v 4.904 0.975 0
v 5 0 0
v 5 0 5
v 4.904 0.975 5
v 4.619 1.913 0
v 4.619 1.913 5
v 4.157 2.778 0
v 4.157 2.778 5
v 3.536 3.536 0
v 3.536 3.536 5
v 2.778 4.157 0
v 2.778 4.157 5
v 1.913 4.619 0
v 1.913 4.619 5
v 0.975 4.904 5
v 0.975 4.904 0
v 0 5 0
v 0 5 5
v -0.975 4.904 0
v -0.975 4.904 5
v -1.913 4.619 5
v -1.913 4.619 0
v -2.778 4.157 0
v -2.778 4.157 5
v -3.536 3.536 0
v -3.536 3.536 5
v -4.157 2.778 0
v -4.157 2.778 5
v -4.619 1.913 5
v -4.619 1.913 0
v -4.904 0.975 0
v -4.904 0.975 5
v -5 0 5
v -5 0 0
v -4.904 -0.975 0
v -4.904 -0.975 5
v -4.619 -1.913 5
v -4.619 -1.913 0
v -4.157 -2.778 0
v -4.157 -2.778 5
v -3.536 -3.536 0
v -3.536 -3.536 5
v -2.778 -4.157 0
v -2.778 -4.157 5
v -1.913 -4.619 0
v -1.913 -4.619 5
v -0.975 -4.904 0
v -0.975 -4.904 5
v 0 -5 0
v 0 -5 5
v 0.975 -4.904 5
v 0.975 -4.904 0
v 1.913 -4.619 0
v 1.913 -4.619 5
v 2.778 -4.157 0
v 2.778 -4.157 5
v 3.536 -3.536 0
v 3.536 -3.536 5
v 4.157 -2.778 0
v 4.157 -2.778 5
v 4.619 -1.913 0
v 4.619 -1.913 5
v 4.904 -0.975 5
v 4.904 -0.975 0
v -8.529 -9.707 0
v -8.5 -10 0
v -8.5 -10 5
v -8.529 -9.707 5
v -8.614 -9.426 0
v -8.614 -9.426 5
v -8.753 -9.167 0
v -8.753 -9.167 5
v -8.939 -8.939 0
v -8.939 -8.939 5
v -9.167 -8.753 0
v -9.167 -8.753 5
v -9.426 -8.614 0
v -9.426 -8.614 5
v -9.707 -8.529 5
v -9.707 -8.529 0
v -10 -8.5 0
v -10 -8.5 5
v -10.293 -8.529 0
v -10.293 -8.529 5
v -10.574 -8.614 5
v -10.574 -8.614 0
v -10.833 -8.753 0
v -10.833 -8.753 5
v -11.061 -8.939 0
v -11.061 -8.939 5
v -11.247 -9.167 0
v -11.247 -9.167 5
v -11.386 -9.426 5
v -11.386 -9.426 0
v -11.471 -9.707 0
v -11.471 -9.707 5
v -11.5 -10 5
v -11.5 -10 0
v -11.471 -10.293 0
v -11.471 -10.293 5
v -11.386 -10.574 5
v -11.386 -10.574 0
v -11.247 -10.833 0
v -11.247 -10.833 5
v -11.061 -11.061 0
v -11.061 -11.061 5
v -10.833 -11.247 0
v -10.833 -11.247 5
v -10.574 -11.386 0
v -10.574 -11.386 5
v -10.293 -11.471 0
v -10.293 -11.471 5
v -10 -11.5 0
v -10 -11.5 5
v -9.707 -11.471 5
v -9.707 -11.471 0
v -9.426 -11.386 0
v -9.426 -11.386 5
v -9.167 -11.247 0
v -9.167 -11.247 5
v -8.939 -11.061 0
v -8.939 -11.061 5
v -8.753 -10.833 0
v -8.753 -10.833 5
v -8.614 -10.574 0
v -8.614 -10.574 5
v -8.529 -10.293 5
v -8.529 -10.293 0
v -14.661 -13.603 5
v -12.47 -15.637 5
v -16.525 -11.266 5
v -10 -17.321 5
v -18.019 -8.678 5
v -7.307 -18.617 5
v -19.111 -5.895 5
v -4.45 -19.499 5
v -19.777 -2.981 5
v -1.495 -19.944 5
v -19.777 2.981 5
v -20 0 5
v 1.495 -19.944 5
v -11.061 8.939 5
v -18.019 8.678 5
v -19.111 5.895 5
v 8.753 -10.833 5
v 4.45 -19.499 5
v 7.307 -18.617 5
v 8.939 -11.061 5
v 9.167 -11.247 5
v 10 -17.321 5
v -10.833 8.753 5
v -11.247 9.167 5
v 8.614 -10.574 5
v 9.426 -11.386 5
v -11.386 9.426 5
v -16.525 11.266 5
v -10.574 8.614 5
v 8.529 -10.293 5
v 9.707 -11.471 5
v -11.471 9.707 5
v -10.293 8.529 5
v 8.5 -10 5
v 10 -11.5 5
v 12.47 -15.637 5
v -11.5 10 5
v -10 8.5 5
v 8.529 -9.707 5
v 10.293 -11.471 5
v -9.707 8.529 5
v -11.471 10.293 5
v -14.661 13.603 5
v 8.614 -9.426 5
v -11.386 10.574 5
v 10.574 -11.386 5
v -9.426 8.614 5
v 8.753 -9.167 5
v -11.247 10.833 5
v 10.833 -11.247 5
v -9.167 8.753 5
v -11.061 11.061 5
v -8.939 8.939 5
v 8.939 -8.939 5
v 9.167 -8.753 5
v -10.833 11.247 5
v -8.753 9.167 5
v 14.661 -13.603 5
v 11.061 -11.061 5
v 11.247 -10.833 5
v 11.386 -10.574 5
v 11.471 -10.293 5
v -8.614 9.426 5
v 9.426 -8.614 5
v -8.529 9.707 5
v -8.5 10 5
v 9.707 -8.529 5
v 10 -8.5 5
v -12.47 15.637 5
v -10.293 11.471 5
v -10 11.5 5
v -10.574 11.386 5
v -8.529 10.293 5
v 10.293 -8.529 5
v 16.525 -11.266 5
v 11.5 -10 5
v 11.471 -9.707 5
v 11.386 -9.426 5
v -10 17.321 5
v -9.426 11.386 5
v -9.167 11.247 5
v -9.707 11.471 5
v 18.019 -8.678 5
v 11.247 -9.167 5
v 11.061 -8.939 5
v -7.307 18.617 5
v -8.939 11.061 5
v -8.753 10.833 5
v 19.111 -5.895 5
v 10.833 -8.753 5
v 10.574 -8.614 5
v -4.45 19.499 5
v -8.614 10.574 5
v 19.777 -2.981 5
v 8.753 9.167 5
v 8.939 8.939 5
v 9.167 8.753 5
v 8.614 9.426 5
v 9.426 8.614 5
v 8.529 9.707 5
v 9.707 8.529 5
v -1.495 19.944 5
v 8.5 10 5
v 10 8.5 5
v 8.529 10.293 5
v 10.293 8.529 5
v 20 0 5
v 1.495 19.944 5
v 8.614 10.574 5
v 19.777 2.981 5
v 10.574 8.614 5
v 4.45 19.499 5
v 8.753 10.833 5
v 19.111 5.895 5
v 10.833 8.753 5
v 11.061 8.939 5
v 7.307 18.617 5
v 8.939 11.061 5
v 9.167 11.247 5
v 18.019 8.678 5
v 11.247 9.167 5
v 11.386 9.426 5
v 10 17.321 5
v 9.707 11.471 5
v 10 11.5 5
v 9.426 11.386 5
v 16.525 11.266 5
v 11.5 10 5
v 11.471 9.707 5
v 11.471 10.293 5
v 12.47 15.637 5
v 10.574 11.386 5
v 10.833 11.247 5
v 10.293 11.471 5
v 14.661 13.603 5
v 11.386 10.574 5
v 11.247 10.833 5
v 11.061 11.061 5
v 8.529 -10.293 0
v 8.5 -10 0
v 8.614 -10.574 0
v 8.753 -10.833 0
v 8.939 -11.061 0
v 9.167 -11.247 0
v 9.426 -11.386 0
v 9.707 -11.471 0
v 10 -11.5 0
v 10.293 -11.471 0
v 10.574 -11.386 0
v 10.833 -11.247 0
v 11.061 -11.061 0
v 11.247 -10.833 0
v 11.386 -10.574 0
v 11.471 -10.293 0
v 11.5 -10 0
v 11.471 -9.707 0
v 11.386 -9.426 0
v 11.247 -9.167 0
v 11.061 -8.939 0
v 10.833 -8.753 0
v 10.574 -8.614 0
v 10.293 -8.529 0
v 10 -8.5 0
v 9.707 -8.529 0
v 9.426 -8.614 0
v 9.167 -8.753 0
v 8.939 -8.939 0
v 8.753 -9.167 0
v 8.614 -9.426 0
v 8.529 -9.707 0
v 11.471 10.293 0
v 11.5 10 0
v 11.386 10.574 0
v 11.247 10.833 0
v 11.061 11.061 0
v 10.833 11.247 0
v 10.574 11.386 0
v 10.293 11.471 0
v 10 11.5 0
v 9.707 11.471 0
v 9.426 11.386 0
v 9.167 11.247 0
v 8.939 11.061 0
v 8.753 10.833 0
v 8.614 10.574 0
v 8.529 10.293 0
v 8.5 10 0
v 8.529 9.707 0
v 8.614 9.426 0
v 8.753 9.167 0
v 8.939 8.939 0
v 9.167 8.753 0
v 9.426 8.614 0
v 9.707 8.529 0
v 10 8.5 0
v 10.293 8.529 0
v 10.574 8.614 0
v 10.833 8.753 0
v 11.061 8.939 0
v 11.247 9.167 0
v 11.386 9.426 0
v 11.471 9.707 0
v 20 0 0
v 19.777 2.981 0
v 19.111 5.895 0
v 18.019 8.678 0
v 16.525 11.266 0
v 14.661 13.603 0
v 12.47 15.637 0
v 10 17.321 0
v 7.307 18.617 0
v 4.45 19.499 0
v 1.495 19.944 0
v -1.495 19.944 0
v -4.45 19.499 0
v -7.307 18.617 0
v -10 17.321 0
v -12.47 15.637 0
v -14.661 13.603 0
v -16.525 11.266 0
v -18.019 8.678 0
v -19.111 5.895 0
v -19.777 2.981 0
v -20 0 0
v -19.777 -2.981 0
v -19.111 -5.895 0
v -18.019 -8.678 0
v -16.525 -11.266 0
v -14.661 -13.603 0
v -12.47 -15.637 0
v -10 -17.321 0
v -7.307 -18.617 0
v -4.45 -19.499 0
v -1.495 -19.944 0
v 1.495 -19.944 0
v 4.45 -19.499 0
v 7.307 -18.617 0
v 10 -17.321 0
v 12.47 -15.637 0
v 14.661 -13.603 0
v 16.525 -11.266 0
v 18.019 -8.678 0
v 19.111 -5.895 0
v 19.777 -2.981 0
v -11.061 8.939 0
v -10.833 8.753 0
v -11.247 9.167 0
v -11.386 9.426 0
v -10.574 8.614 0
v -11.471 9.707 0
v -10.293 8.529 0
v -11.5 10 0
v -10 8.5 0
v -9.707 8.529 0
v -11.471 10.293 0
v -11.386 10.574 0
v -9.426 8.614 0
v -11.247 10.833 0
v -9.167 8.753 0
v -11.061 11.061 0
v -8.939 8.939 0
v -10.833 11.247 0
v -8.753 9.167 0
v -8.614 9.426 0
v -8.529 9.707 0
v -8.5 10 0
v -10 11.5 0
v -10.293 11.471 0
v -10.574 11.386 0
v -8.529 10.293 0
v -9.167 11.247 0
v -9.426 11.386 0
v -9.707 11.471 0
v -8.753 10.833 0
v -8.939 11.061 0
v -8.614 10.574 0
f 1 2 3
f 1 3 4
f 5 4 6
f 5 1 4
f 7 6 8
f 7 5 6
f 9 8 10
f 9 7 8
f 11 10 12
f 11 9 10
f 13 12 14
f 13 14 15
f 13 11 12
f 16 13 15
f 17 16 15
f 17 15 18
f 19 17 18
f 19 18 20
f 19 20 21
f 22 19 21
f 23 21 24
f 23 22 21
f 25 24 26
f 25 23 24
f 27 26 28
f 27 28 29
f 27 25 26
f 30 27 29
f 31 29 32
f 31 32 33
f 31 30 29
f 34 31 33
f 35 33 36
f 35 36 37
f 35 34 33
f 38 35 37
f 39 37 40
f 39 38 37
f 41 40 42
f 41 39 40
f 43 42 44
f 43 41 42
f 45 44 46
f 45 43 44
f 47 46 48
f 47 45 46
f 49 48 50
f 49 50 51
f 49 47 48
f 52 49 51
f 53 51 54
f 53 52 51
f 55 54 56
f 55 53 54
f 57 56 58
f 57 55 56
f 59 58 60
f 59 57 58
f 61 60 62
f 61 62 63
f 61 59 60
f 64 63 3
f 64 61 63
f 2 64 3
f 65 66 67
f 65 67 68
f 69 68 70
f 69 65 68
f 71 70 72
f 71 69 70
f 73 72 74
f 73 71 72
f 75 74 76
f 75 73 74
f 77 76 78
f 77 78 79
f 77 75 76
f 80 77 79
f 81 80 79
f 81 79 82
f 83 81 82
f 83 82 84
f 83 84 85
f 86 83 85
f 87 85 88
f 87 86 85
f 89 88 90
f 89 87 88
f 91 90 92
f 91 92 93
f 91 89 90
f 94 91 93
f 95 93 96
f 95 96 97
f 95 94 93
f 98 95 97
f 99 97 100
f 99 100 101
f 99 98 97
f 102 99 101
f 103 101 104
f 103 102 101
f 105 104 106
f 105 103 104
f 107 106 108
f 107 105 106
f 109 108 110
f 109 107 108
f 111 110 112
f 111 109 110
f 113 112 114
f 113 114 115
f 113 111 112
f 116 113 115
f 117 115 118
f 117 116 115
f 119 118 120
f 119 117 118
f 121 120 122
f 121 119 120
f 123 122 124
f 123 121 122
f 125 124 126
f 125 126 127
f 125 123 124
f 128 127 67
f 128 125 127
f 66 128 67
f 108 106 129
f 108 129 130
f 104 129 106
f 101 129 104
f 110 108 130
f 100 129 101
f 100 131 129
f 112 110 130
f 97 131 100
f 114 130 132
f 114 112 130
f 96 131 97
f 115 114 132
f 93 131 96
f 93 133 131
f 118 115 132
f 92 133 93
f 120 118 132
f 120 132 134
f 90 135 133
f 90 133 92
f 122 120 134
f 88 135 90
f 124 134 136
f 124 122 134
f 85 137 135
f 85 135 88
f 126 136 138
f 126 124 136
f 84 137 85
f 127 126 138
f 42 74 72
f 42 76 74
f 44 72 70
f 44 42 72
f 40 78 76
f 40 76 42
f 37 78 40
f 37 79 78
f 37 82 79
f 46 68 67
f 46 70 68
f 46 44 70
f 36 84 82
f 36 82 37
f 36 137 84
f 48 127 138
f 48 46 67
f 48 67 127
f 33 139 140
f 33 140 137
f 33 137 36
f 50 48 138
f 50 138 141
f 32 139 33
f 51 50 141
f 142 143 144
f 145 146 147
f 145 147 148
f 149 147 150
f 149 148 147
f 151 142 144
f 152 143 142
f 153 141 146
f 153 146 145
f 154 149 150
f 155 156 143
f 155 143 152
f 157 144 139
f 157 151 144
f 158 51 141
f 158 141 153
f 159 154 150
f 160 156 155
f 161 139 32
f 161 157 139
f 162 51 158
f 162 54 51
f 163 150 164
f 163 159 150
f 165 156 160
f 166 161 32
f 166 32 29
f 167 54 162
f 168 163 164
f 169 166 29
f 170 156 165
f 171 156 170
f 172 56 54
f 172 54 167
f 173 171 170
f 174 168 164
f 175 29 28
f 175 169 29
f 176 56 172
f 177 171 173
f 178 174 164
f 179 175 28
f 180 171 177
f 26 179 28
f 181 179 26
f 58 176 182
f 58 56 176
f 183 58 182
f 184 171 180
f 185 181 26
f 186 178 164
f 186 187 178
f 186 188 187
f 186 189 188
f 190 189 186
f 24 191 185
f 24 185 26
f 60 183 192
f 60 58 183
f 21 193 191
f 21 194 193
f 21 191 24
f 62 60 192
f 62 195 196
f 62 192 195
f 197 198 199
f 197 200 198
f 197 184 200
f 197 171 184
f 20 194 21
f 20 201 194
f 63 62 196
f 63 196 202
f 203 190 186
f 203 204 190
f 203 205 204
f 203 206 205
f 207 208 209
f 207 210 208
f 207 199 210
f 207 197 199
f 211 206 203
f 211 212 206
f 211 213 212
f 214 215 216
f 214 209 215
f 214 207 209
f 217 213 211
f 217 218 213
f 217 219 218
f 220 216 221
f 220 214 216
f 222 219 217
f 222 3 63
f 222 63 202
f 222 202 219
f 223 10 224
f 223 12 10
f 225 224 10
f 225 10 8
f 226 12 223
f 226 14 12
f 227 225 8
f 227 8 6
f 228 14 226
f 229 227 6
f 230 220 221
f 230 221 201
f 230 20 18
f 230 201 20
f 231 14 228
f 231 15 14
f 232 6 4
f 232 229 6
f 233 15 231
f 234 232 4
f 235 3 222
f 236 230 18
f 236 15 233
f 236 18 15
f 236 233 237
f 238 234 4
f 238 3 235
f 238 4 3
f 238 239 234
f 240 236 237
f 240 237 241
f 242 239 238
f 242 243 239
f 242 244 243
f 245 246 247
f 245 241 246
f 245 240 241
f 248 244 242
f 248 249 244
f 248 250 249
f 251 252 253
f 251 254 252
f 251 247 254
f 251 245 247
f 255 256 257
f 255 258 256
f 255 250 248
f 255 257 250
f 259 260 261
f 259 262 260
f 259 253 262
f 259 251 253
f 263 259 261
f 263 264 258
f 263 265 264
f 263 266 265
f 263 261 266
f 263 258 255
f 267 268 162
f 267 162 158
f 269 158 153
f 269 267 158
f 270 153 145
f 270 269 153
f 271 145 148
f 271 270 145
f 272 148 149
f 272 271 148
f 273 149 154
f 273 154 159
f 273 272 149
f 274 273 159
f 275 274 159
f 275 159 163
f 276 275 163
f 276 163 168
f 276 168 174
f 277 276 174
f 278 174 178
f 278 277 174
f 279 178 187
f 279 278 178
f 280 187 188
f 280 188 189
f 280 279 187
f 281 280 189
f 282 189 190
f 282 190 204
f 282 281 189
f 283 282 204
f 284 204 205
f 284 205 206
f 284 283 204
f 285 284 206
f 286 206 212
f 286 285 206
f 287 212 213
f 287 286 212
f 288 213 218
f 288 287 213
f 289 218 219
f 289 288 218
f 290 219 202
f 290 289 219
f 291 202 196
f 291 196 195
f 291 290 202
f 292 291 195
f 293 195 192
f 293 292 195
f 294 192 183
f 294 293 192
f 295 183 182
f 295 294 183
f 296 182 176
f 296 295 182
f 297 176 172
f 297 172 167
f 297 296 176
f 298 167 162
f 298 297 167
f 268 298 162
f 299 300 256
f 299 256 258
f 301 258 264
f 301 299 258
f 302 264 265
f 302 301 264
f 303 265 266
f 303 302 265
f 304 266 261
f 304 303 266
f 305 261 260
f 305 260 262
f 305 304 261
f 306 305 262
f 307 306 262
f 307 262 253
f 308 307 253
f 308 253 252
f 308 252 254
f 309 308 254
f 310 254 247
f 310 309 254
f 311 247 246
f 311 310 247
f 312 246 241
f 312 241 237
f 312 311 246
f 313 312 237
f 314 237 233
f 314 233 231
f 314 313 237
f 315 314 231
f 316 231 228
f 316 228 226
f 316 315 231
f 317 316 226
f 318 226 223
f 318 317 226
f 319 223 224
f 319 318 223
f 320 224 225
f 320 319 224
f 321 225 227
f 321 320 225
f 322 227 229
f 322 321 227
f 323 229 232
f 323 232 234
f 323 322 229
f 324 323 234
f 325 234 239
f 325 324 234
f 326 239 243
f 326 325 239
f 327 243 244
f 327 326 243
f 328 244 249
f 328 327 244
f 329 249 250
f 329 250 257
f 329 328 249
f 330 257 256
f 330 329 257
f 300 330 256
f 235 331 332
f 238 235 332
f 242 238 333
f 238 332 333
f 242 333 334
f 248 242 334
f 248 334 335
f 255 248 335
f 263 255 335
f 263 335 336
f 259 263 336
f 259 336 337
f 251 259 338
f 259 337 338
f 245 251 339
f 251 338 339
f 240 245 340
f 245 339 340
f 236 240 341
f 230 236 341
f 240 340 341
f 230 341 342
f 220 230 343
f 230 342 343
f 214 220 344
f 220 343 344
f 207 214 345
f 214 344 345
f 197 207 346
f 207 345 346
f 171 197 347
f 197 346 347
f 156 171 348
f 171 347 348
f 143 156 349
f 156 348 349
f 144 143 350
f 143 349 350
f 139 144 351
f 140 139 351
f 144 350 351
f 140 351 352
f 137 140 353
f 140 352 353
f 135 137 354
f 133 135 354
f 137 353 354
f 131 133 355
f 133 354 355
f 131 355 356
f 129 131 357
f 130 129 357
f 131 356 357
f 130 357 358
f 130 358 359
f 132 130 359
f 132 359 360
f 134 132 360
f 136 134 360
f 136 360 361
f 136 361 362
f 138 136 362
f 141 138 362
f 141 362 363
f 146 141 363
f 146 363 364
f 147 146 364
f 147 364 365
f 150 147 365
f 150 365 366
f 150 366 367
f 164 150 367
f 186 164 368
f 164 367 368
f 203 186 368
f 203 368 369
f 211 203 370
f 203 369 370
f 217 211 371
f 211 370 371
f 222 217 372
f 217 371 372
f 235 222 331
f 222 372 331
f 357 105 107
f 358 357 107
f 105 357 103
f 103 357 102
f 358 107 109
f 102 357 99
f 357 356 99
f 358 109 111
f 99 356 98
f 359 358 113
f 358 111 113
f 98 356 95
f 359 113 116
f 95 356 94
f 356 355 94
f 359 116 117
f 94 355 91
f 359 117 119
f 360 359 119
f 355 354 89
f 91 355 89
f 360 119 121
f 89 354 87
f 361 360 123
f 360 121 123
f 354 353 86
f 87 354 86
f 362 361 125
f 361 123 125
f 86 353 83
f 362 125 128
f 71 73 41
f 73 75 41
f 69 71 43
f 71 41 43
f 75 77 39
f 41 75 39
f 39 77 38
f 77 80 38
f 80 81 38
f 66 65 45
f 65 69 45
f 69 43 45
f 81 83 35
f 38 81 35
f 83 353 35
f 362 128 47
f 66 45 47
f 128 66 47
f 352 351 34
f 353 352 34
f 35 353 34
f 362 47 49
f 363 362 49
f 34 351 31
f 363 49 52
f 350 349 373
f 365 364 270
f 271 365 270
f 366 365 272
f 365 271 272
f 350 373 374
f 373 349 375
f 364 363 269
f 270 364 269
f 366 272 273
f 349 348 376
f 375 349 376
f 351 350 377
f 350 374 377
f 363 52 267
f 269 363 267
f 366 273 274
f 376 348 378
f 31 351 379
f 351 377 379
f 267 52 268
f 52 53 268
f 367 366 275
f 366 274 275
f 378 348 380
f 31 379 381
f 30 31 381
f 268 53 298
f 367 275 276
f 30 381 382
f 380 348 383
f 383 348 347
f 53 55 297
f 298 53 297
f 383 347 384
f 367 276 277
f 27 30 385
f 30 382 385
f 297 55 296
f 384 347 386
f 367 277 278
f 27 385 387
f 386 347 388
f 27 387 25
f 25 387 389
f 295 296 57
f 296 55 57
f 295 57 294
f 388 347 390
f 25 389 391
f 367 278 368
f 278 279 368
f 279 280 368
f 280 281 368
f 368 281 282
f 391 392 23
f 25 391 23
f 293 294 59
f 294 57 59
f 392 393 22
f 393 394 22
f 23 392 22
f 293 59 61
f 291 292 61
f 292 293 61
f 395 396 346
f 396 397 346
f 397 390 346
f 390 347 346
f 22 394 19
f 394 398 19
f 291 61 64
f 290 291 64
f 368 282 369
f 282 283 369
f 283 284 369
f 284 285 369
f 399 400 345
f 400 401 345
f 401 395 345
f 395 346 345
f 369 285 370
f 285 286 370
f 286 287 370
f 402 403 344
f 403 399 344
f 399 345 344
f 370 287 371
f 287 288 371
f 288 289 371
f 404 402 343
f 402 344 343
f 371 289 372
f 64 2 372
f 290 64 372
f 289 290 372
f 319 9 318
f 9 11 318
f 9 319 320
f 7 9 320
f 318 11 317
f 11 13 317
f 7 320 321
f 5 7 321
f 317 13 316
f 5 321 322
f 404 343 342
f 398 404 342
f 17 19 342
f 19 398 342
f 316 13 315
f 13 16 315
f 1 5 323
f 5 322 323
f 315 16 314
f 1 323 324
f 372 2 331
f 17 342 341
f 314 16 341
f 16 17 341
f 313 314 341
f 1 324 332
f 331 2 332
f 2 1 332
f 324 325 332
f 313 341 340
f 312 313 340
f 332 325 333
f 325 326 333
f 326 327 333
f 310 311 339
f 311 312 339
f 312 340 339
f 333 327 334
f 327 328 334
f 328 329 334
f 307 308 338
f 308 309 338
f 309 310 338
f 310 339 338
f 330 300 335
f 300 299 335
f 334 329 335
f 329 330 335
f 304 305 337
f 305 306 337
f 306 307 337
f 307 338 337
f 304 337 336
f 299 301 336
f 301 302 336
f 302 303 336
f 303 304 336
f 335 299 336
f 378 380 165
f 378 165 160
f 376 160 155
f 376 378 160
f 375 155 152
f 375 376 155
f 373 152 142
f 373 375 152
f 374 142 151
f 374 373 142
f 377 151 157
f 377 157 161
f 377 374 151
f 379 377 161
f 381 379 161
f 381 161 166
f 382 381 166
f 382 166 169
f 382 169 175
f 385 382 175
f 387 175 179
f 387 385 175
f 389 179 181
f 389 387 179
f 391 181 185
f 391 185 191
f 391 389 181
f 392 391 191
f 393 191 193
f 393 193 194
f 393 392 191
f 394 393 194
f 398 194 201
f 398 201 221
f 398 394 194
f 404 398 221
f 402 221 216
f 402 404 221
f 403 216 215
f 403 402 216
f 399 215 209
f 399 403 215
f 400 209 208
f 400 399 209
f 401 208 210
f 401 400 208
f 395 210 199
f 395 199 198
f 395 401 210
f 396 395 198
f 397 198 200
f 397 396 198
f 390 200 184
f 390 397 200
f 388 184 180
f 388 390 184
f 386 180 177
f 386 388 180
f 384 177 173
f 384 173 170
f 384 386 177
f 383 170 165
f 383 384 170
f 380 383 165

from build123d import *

# Parameters (mm, degrees)
SKETCH_1_R      = 20
SKETCH_1_R_2    = 5
SKETCH_1_R_3    = 1.5
EXTRUDE_1_DEPTH = 5


with BuildPart() as part:
    # 草圖1 → 填料-伸長1 (new body)
    with BuildSketch(Plane.XY):
        Circle(SKETCH_1_R)
        Circle(SKETCH_1_R_2, mode=Mode.SUBTRACT)
        with Locations((-10, -10)):
            Circle(SKETCH_1_R_3, mode=Mode.SUBTRACT)
        with Locations(Location((-10, 10, 0), (0, 0, 180))):
            Circle(SKETCH_1_R_3, mode=Mode.SUBTRACT)
        with Locations((10, 10)):
            Circle(SKETCH_1_R_3, mode=Mode.SUBTRACT)
        with Locations(Location((10, -10, 0), (0, 0, 180))):
            Circle(SKETCH_1_R_3, mode=Mode.SUBTRACT)
    extrude(amount=EXTRUDE_1_DEPTH)


solid = part.part
